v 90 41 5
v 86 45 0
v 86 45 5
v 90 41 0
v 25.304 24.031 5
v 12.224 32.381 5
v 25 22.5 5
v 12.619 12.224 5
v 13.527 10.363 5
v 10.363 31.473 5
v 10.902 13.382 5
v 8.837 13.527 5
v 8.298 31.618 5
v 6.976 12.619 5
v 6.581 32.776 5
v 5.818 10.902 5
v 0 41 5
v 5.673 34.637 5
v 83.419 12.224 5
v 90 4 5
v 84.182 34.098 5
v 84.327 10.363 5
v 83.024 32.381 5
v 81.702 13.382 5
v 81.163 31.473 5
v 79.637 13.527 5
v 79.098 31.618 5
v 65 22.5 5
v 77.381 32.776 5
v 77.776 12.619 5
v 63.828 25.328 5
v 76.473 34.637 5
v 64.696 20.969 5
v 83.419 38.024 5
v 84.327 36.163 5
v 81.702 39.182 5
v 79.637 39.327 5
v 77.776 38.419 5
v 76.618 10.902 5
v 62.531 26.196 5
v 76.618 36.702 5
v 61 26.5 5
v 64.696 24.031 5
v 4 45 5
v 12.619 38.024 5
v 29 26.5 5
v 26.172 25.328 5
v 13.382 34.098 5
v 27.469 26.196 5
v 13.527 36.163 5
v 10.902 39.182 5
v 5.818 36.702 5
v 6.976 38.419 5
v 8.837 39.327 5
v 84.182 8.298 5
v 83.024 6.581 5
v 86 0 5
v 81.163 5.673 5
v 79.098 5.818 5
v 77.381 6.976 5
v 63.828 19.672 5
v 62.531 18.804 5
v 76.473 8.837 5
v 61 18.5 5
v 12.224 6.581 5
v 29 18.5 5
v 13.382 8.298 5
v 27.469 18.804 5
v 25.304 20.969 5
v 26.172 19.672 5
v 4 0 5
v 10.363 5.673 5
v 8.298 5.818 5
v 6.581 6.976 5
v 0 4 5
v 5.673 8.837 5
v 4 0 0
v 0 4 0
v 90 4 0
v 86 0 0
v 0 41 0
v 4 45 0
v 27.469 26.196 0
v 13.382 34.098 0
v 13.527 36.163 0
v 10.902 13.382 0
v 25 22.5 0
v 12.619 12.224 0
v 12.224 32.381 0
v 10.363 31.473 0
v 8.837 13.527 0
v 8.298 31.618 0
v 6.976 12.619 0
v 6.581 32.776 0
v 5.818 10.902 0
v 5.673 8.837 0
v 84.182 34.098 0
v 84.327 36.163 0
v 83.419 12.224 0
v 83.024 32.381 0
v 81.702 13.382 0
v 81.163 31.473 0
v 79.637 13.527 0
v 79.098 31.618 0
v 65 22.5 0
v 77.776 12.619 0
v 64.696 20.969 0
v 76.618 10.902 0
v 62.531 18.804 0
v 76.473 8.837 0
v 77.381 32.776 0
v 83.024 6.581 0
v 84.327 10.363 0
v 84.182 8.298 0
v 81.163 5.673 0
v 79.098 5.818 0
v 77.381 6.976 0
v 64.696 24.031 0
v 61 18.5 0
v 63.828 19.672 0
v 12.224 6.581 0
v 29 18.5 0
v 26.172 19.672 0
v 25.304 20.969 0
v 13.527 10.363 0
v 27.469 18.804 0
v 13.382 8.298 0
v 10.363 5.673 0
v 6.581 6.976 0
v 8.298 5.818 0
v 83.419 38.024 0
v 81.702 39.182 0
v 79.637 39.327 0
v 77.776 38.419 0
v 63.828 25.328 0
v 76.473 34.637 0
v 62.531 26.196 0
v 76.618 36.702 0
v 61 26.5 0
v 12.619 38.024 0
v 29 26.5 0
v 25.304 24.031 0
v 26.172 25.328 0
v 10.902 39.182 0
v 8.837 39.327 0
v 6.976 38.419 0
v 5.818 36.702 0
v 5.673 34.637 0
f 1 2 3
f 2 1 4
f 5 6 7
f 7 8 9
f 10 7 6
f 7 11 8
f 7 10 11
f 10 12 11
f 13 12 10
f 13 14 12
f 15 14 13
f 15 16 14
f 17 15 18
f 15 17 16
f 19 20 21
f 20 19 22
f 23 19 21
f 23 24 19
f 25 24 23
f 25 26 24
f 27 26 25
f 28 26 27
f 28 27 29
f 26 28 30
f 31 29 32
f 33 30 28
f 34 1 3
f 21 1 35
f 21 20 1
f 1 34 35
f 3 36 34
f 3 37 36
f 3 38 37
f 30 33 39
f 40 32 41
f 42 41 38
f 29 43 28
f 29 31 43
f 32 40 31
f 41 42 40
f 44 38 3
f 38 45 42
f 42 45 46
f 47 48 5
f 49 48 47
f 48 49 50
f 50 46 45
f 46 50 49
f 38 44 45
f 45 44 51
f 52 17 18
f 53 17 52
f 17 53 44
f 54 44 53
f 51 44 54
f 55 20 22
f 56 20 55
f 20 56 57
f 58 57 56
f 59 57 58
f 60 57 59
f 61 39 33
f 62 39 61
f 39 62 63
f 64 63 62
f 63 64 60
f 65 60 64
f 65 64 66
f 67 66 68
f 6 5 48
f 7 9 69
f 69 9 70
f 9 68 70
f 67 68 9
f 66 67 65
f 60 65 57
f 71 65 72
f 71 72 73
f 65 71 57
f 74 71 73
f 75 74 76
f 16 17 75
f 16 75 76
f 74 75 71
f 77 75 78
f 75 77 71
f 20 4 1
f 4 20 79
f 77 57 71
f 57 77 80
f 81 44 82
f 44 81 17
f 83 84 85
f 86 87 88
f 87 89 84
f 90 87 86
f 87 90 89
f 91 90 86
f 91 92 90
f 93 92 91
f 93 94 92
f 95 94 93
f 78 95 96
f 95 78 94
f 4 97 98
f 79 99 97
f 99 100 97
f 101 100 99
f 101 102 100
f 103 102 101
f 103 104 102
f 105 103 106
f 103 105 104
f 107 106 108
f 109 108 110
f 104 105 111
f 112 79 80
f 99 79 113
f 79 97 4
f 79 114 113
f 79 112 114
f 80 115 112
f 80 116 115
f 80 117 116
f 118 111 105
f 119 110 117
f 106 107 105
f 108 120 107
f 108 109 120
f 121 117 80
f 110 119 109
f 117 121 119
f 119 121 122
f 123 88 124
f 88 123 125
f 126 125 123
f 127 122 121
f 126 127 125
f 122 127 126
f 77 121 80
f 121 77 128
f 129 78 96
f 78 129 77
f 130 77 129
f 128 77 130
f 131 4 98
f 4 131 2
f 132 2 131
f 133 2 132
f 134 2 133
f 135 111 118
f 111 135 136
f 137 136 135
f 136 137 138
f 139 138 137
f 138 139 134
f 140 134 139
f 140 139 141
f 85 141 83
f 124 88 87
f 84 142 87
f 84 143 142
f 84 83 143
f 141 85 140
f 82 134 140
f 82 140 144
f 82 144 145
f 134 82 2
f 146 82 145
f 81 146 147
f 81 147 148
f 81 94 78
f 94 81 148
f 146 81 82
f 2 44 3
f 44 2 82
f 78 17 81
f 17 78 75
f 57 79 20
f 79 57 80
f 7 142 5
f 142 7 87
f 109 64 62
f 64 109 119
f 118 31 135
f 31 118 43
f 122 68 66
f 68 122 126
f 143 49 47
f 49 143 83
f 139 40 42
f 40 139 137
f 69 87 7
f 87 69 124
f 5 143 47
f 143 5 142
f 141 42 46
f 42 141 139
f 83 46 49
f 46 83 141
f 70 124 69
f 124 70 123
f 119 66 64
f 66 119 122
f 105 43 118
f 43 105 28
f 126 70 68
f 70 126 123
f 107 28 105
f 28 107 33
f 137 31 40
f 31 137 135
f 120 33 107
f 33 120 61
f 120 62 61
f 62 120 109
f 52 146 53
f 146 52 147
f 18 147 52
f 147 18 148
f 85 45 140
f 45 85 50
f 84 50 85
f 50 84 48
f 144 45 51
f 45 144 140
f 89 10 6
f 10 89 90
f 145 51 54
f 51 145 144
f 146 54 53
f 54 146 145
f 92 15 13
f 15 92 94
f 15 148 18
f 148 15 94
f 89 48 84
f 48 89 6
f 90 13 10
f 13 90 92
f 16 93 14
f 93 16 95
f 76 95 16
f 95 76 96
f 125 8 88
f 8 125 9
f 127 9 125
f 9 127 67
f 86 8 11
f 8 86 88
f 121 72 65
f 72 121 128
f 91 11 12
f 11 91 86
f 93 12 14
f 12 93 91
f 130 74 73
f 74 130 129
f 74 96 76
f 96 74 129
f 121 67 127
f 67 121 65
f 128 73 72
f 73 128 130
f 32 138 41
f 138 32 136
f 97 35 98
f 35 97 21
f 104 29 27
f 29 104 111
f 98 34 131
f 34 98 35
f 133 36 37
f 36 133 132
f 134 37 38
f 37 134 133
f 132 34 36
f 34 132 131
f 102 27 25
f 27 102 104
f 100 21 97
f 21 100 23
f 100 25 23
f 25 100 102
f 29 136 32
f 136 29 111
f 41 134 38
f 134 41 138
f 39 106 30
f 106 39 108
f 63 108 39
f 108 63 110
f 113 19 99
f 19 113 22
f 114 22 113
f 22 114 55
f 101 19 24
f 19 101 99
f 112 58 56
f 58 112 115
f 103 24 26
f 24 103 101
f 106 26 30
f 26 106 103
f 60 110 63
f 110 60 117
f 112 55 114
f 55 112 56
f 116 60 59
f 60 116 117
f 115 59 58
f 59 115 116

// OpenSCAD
$fn = 32;

// ----------------------------------------------------------------------
// Bracket plate: slot plate 90 x 45
// ----------------------------------------------------------------------

// --- parameters (mm) ---
hole_r = 4;               // bolt hole radius
plate_t = 5;              // plate thickness, Z (extrusion height)
plate_l = 90;             // plate length
plate_w = 45;             // plate width
slot_l = 32;              // slot straight length
slot_r = 4;               // slot end radius

slot_len = slot_l + 2 * slot_r;
slot_w = 2 * slot_r;
hole_d2 = 2 * hole_r;

profile = [[4, 0], [86, 0], [90, 4], [90, 41], [86, 45], [4, 45], [0, 41], [0, 4]];  // primary outline, 8 points, counter clockwise
void_1 = [[61, 18.5], [62.531, 18.804], [63.828, 19.672], [64.696, 20.969], [65, 22.5], [64.696, 24.031], [63.828, 25.328], [62.531, 26.196], [61, 26.5], [29, 26.5], [27.469, 26.196], [26.172, 25.328], [25.304, 24.031], [25, 22.5], [25.304, 20.969], [26.172, 19.672], [27.469, 18.804], [29, 18.5]];  // grip slot, 18 points
void_2 = [[13.527, 36.163], [12.619, 38.024], [10.902, 39.182], [8.837, 39.327], [6.976, 38.419], [5.818, 36.702], [5.673, 34.637], [6.581, 32.776], [8.298, 31.618], [10.363, 31.473], [12.224, 32.381], [13.382, 34.098]];  // corner hole, 12 points
void_3 = [[13.527, 10.363], [12.619, 12.224], [10.902, 13.382], [8.837, 13.527], [6.976, 12.619], [5.818, 10.902], [5.673, 8.837], [6.581, 6.976], [8.298, 5.818], [10.363, 5.673], [12.224, 6.581], [13.382, 8.298]];  // corner hole, 12 points
void_4 = [[84.327, 36.163], [83.419, 38.024], [81.702, 39.182], [79.637, 39.327], [77.776, 38.419], [76.618, 36.702], [76.473, 34.637], [77.381, 32.776], [79.098, 31.618], [81.163, 31.473], [83.024, 32.381], [84.182, 34.098]];  // corner hole, 12 points
void_5 = [[84.327, 10.363], [83.419, 12.224], [81.702, 13.382], [79.637, 13.527], [77.776, 12.619], [76.618, 10.902], [76.473, 8.837], [77.381, 6.976], [79.098, 5.818], [81.163, 5.673], [83.024, 6.581], [84.182, 8.298]];  // corner hole, 12 points

// --- the one profile operation ---
difference() {
  linear_extrude(height = plate_t) polygon(points = profile);
  translate([0, 0, -1])
    linear_extrude(height = plate_t + 2) polygon(points = void_1);
  translate([0, 0, -1])
    linear_extrude(height = plate_t + 2) polygon(points = void_2);
  translate([0, 0, -1])
    linear_extrude(height = plate_t + 2) polygon(points = void_3);
  translate([0, 0, -1])
    linear_extrude(height = plate_t + 2) polygon(points = void_4);
  translate([0, 0, -1])
    linear_extrude(height = plate_t + 2) polygon(points = void_5);
}
